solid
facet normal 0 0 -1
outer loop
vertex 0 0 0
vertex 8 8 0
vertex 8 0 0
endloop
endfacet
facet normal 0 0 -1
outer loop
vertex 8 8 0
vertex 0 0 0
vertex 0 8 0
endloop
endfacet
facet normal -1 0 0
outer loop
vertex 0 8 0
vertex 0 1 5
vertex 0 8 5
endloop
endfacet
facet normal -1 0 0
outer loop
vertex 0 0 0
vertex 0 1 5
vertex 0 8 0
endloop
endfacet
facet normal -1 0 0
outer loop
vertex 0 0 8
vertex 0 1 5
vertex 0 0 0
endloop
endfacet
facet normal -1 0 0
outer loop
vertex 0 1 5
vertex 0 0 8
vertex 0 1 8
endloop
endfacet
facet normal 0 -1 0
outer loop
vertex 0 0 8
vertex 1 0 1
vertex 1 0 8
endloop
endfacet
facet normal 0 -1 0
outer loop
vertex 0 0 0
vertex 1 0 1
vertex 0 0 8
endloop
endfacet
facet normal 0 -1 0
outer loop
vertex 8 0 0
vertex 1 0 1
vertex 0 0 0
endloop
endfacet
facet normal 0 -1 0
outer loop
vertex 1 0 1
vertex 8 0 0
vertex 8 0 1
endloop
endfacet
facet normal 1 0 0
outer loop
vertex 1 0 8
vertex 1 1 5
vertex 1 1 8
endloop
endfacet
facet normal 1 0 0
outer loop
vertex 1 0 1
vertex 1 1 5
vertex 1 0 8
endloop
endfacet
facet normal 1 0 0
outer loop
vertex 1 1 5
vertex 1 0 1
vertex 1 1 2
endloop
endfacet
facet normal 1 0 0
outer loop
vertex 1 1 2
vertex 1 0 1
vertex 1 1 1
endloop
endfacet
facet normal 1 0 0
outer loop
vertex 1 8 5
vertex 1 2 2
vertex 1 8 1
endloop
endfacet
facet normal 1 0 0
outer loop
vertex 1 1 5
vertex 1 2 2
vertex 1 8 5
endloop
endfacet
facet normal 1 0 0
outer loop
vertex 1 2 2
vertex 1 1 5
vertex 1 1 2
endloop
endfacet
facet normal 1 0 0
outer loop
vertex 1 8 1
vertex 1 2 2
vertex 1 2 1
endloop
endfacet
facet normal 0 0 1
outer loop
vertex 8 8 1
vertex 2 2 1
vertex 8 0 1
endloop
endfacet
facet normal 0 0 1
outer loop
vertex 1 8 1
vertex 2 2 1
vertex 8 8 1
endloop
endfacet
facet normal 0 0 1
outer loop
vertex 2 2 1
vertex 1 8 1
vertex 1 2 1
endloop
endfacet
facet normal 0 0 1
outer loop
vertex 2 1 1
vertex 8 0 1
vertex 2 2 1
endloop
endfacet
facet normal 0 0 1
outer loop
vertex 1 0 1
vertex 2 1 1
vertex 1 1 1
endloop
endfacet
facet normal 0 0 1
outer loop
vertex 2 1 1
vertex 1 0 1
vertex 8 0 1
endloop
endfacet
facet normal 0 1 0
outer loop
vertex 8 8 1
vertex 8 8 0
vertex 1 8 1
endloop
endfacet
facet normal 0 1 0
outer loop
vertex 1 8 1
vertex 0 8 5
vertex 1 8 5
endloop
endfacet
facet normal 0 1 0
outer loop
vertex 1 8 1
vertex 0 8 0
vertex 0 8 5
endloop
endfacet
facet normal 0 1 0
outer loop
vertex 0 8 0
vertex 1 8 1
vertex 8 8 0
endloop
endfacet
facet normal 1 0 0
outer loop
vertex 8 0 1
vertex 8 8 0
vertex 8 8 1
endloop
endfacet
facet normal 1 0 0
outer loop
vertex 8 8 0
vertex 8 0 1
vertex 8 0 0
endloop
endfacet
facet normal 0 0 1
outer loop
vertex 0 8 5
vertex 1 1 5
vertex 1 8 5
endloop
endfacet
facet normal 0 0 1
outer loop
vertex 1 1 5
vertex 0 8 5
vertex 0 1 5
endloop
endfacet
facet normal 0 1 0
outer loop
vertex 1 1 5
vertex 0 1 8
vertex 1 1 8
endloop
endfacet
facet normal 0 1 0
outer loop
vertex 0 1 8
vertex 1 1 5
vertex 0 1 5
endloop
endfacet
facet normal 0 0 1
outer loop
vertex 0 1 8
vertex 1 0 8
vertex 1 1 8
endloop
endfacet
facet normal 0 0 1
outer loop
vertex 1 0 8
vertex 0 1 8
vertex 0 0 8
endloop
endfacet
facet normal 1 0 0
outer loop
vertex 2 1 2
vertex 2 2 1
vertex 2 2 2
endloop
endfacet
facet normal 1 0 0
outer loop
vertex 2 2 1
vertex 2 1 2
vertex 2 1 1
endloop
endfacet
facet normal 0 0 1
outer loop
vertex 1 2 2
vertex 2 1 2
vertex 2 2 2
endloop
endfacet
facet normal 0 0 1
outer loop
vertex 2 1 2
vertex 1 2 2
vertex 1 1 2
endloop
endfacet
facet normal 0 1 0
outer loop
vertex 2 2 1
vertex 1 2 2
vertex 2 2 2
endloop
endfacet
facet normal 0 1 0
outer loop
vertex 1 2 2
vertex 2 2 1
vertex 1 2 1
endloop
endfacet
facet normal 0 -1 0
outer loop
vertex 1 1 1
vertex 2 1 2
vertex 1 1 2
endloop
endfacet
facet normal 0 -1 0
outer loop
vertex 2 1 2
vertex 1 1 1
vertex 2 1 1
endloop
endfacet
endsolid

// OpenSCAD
union() {
    translate([0.0, 0.0, 0.0]) cube([1, 1, 1]);
    translate([0.0, 1.0, 0.0]) cube([1, 1, 1]);
    translate([0.0, 2.0, 0.0]) cube([1, 1, 1]);
    translate([0.0, 3.0, 0.0]) cube([1, 1, 1]);
    translate([0.0, 4.0, 0.0]) cube([1, 1, 1]);
    translate([0.0, 5.0, 0.0]) cube([1, 1, 1]);
    translate([0.0, 6.0, 0.0]) cube([1, 1, 1]);
    translate([0.0, 7.0, 0.0]) cube([1, 1, 1]);
    translate([1.0, 0.0, 0.0]) cube([1, 1, 1]);
    translate([1.0, 1.0, 0.0]) cube([1, 1, 1]);
    translate([1.0, 2.0, 0.0]) cube([1, 1, 1]);
    translate([1.0, 3.0, 0.0]) cube([1, 1, 1]);
    translate([1.0, 4.0, 0.0]) cube([1, 1, 1]);
    translate([1.0, 5.0, 0.0]) cube([1, 1, 1]);
    translate([1.0, 6.0, 0.0]) cube([1, 1, 1]);
    translate([1.0, 7.0, 0.0]) cube([1, 1, 1]);
    translate([2.0, 0.0, 0.0]) cube([1, 1, 1]);
    translate([2.0, 1.0, 0.0]) cube([1, 1, 1]);
    translate([2.0, 2.0, 0.0]) cube([1, 1, 1]);
    translate([2.0, 3.0, 0.0]) cube([1, 1, 1]);
    translate([2.0, 4.0, 0.0]) cube([1, 1, 1]);
    translate([2.0, 5.0, 0.0]) cube([1, 1, 1]);
    translate([2.0, 6.0, 0.0]) cube([1, 1, 1]);
    translate([2.0, 7.0, 0.0]) cube([1, 1, 1]);
    translate([3.0, 0.0, 0.0]) cube([1, 1, 1]);
    translate([3.0, 1.0, 0.0]) cube([1, 1, 1]);
    translate([3.0, 2.0, 0.0]) cube([1, 1, 1]);
    translate([3.0, 3.0, 0.0]) cube([1, 1, 1]);
    translate([3.0, 4.0, 0.0]) cube([1, 1, 1]);
    translate([3.0, 5.0, 0.0]) cube([1, 1, 1]);
    translate([3.0, 6.0, 0.0]) cube([1, 1, 1]);
    translate([3.0, 7.0, 0.0]) cube([1, 1, 1]);
    translate([4.0, 0.0, 0.0]) cube([1, 1, 1]);
    translate([4.0, 1.0, 0.0]) cube([1, 1, 1]);
    translate([4.0, 2.0, 0.0]) cube([1, 1, 1]);
    translate([4.0, 3.0, 0.0]) cube([1, 1, 1]);
    translate([4.0, 4.0, 0.0]) cube([1, 1, 1]);
    translate([4.0, 5.0, 0.0]) cube([1, 1, 1]);
    translate([4.0, 6.0, 0.0]) cube([1, 1, 1]);
    translate([4.0, 7.0, 0.0]) cube([1, 1, 1]);
    translate([5.0, 0.0, 0.0]) cube([1, 1, 1]);
    translate([5.0, 1.0, 0.0]) cube([1, 1, 1]);
    translate([5.0, 2.0, 0.0]) cube([1, 1, 1]);
    translate([5.0, 3.0, 0.0]) cube([1, 1, 1]);
    translate([5.0, 4.0, 0.0]) cube([1, 1, 1]);
    translate([5.0, 5.0, 0.0]) cube([1, 1, 1]);
    translate([5.0, 6.0, 0.0]) cube([1, 1, 1]);
    translate([5.0, 7.0, 0.0]) cube([1, 1, 1]);
    translate([6.0, 0.0, 0.0]) cube([1, 1, 1]);
    translate([6.0, 1.0, 0.0]) cube([1, 1, 1]);
    translate([6.0, 2.0, 0.0]) cube([1, 1, 1]);
    translate([6.0, 3.0, 0.0]) cube([1, 1, 1]);
    translate([6.0, 4.0, 0.0]) cube([1, 1, 1]);
    translate([6.0, 5.0, 0.0]) cube([1, 1, 1]);
    translate([6.0, 6.0, 0.0]) cube([1, 1, 1]);
    translate([6.0, 7.0, 0.0]) cube([1, 1, 1]);
    translate([7.0, 0.0, 0.0]) cube([1, 1, 1]);
    translate([7.0, 1.0, 0.0]) cube([1, 1, 1]);
    translate([7.0, 2.0, 0.0]) cube([1, 1, 1]);
    translate([7.0, 3.0, 0.0]) cube([1, 1, 1]);
    translate([7.0, 4.0, 0.0]) cube([1, 1, 1]);
    translate([7.0, 5.0, 0.0]) cube([1, 1, 1]);
    translate([7.0, 6.0, 0.0]) cube([1, 1, 1]);
    translate([7.0, 7.0, 0.0]) cube([1, 1, 1]);
    translate([0.0, 0.0, 1.0]) cube([1, 1, 1]);
    translate([0.0, 0.0, 2.0]) cube([1, 1, 1]);
    translate([0.0, 0.0, 3.0]) cube([1, 1, 1]);
    translate([0.0, 0.0, 4.0]) cube([1, 1, 1]);
    translate([0.0, 1.0, 1.0]) cube([1, 1, 1]);
    translate([0.0, 1.0, 2.0]) cube([1, 1, 1]);
    translate([0.0, 1.0, 3.0]) cube([1, 1, 1]);
    translate([0.0, 1.0, 4.0]) cube([1, 1, 1]);
    translate([0.0, 2.0, 1.0]) cube([1, 1, 1]);
    translate([0.0, 2.0, 2.0]) cube([1, 1, 1]);
    translate([0.0, 2.0, 3.0]) cube([1, 1, 1]);
    translate([0.0, 2.0, 4.0]) cube([1, 1, 1]);
    translate([0.0, 3.0, 1.0]) cube([1, 1, 1]);
    translate([0.0, 3.0, 2.0]) cube([1, 1, 1]);
    translate([0.0, 3.0, 3.0]) cube([1, 1, 1]);
    translate([0.0, 3.0, 4.0]) cube([1, 1, 1]);
    translate([0.0, 4.0, 1.0]) cube([1, 1, 1]);
    translate([0.0, 4.0, 2.0]) cube([1, 1, 1]);
    translate([0.0, 4.0, 3.0]) cube([1, 1, 1]);
    translate([0.0, 4.0, 4.0]) cube([1, 1, 1]);
    translate([0.0, 5.0, 1.0]) cube([1, 1, 1]);
    translate([0.0, 5.0, 2.0]) cube([1, 1, 1]);
    translate([0.0, 5.0, 3.0]) cube([1, 1, 1]);
    translate([0.0, 5.0, 4.0]) cube([1, 1, 1]);
    translate([0.0, 6.0, 1.0]) cube([1, 1, 1]);
    translate([0.0, 6.0, 2.0]) cube([1, 1, 1]);
    translate([0.0, 6.0, 3.0]) cube([1, 1, 1]);
    translate([0.0, 6.0, 4.0]) cube([1, 1, 1]);
    translate([0.0, 7.0, 1.0]) cube([1, 1, 1]);
    translate([0.0, 7.0, 2.0]) cube([1, 1, 1]);
    translate([0.0, 7.0, 3.0]) cube([1, 1, 1]);
    translate([0.0, 7.0, 4.0]) cube([1, 1, 1]);
    translate([0.0, 0.0, 5.0]) cube([1, 1, 1]);
    translate([0.0, 0.0, 6.0]) cube([1, 1, 1]);
    translate([0.0, 0.0, 7.0]) cube([1, 1, 1]);
    translate([1.0, 1.0, 1.0]) cube([1, 1, 1]);
}
